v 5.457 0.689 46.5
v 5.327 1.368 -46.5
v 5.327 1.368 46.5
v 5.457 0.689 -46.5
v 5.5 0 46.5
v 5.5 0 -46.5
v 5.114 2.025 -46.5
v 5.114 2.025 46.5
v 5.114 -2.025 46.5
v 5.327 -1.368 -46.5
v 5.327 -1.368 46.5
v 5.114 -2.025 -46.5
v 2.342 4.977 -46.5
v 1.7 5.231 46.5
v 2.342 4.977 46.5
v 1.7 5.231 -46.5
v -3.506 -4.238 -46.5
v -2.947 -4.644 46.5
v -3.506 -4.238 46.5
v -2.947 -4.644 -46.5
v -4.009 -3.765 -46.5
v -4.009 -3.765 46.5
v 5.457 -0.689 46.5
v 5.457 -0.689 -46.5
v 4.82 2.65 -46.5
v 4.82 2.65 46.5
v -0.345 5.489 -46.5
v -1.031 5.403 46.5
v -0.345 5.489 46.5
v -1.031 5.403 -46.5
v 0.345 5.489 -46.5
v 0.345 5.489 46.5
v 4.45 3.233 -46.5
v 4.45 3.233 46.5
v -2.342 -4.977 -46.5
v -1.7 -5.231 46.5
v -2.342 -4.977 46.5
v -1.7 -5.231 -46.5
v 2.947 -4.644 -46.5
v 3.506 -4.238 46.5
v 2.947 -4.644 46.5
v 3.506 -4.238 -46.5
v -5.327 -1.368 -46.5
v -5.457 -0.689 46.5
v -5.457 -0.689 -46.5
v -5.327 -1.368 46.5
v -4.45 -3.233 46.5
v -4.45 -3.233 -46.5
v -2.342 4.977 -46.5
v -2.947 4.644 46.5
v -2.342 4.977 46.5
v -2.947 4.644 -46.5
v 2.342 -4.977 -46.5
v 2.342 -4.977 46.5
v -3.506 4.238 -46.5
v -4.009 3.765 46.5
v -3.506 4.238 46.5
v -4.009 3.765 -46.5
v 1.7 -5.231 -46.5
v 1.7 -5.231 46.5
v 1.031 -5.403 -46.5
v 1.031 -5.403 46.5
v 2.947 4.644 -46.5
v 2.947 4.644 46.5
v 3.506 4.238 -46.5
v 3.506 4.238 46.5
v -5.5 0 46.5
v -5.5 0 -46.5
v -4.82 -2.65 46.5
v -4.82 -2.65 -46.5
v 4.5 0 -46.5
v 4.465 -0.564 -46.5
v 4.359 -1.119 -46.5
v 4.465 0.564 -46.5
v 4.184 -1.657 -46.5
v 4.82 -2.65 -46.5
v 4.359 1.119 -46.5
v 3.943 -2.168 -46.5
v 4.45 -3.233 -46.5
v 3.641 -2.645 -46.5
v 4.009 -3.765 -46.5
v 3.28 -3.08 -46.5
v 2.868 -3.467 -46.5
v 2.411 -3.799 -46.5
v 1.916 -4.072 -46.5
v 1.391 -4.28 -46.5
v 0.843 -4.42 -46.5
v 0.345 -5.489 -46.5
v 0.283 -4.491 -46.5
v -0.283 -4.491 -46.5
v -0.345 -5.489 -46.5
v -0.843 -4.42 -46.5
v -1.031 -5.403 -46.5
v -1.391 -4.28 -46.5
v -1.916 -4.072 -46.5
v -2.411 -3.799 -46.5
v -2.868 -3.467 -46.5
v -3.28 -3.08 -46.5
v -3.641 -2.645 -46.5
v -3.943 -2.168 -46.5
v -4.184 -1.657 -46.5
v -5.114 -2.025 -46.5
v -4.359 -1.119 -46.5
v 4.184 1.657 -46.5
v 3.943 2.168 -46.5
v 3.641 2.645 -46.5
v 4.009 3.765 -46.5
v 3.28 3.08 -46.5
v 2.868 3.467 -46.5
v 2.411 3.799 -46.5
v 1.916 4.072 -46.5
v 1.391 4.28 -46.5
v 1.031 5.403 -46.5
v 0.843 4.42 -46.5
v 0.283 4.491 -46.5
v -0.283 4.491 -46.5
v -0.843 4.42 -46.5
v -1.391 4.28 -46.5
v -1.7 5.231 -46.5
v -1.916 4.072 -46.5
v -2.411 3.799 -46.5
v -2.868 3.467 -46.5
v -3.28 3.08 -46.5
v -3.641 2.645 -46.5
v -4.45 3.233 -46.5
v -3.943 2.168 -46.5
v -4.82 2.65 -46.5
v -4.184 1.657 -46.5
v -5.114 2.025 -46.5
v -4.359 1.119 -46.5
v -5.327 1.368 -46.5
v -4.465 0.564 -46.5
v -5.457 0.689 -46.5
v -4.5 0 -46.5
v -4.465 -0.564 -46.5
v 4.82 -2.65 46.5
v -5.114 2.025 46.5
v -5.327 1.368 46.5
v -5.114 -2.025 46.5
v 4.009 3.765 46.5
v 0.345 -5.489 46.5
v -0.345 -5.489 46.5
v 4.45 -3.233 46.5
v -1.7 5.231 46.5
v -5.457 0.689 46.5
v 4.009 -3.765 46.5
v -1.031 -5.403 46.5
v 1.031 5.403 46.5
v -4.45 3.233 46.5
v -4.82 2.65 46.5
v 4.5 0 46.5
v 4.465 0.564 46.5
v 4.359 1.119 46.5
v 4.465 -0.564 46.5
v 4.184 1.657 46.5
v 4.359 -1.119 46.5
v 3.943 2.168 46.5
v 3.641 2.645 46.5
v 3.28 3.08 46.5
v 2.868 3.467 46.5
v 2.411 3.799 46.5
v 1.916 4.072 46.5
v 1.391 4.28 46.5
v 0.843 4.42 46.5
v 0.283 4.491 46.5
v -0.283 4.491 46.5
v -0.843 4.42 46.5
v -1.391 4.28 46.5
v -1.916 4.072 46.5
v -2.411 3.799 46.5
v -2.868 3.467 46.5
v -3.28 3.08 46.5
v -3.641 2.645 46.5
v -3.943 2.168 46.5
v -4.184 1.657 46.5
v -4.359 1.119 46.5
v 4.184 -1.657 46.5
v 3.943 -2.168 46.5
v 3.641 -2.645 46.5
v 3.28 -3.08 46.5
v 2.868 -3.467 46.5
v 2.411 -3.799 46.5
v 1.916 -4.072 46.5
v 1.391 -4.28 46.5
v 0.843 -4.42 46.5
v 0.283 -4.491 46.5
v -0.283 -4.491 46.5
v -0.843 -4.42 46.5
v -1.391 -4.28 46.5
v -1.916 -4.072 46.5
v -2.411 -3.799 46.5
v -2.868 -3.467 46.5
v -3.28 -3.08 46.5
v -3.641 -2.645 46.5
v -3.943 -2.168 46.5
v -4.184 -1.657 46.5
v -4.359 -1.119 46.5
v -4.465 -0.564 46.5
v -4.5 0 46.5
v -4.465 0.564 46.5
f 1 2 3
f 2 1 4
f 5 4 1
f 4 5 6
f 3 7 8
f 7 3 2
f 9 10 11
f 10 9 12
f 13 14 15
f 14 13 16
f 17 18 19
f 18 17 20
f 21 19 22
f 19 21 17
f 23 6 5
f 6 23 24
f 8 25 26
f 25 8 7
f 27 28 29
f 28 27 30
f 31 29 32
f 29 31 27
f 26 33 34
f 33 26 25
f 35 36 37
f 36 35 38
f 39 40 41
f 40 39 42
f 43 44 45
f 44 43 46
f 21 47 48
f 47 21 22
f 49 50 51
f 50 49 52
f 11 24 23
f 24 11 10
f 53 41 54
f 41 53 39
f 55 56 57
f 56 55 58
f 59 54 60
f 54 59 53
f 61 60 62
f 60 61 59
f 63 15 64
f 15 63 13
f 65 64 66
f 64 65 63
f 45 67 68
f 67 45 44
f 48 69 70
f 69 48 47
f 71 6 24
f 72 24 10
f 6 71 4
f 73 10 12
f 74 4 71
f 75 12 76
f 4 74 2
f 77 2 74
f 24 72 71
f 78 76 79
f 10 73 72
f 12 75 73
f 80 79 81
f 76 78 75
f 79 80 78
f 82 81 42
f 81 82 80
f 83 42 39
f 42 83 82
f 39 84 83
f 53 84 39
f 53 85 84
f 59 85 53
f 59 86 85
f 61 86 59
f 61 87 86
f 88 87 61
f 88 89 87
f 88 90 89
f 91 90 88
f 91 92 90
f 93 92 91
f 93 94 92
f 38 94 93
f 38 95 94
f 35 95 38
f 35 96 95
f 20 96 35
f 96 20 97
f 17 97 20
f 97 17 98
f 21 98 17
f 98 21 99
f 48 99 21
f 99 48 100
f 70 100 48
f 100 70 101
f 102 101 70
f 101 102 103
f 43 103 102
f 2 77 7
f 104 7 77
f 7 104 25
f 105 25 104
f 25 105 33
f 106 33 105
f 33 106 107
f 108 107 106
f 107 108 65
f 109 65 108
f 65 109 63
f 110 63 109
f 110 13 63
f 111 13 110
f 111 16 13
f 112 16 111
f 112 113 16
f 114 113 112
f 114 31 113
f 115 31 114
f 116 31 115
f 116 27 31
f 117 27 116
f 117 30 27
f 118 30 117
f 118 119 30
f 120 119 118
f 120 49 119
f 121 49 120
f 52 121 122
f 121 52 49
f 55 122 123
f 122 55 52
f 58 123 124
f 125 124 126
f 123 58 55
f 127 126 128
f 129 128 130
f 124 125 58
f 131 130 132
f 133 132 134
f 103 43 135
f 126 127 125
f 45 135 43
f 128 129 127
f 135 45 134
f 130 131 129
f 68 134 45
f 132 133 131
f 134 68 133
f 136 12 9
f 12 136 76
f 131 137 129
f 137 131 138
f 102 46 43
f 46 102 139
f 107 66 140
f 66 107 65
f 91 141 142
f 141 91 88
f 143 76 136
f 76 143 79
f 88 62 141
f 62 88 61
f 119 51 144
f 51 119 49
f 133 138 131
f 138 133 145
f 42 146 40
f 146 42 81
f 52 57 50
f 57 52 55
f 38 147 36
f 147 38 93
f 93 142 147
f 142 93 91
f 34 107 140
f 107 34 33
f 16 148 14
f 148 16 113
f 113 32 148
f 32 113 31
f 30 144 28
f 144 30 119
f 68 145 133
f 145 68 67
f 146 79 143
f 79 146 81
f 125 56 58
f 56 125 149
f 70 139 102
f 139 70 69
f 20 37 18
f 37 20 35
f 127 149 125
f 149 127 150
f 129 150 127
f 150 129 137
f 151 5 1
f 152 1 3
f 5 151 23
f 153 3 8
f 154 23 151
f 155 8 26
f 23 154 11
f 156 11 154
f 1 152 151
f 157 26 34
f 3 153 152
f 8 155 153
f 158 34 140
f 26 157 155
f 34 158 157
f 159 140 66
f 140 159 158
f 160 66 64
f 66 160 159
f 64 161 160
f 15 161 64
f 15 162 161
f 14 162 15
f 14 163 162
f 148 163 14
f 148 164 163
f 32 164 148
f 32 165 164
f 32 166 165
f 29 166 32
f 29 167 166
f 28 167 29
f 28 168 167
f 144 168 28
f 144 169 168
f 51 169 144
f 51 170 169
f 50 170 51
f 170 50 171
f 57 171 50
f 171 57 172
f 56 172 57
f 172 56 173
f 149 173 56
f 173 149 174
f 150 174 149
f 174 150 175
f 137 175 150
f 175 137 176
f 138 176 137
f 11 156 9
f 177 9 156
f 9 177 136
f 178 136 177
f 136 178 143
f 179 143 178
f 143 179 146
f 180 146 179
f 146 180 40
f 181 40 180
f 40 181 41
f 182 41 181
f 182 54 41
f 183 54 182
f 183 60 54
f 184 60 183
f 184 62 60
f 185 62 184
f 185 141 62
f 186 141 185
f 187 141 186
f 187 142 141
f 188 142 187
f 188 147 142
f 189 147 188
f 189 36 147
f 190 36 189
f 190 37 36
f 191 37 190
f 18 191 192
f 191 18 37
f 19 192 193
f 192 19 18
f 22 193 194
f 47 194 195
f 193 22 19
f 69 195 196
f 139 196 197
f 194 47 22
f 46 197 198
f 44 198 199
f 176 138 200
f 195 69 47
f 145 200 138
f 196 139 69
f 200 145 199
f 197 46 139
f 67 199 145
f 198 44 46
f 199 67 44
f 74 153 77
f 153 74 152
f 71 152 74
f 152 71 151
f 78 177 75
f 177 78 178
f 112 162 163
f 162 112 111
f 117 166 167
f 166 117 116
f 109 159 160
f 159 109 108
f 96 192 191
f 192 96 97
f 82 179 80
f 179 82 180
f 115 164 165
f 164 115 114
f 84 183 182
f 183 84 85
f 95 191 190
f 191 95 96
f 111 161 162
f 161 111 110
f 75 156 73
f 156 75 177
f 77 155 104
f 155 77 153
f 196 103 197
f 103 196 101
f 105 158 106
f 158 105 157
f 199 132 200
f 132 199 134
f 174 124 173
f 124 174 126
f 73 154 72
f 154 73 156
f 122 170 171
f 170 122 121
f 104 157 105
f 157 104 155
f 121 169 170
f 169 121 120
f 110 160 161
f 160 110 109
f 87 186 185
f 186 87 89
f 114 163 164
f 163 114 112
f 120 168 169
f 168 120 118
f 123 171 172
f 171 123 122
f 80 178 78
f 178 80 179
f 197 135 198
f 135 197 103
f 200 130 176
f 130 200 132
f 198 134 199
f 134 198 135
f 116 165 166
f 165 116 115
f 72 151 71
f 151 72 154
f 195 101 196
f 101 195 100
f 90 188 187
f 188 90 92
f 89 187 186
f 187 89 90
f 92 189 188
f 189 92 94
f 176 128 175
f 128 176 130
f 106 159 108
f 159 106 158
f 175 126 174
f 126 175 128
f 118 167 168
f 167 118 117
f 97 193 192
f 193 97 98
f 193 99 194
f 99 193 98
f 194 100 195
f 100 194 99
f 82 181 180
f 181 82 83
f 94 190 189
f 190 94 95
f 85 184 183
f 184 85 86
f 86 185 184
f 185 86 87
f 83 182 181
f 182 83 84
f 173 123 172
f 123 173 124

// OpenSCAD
$fn = 50;


difference() {
	union() {
		translate(v = [0, 0, -46.5000000000]) {
			cylinder(h = 93, r = 5.5000000000);
		}
	}
	union() {
		translate(v = [0, 0, -100.0000000000]) {
			cylinder(h = 200, r = 4.5000000000);
		}
	}
}
